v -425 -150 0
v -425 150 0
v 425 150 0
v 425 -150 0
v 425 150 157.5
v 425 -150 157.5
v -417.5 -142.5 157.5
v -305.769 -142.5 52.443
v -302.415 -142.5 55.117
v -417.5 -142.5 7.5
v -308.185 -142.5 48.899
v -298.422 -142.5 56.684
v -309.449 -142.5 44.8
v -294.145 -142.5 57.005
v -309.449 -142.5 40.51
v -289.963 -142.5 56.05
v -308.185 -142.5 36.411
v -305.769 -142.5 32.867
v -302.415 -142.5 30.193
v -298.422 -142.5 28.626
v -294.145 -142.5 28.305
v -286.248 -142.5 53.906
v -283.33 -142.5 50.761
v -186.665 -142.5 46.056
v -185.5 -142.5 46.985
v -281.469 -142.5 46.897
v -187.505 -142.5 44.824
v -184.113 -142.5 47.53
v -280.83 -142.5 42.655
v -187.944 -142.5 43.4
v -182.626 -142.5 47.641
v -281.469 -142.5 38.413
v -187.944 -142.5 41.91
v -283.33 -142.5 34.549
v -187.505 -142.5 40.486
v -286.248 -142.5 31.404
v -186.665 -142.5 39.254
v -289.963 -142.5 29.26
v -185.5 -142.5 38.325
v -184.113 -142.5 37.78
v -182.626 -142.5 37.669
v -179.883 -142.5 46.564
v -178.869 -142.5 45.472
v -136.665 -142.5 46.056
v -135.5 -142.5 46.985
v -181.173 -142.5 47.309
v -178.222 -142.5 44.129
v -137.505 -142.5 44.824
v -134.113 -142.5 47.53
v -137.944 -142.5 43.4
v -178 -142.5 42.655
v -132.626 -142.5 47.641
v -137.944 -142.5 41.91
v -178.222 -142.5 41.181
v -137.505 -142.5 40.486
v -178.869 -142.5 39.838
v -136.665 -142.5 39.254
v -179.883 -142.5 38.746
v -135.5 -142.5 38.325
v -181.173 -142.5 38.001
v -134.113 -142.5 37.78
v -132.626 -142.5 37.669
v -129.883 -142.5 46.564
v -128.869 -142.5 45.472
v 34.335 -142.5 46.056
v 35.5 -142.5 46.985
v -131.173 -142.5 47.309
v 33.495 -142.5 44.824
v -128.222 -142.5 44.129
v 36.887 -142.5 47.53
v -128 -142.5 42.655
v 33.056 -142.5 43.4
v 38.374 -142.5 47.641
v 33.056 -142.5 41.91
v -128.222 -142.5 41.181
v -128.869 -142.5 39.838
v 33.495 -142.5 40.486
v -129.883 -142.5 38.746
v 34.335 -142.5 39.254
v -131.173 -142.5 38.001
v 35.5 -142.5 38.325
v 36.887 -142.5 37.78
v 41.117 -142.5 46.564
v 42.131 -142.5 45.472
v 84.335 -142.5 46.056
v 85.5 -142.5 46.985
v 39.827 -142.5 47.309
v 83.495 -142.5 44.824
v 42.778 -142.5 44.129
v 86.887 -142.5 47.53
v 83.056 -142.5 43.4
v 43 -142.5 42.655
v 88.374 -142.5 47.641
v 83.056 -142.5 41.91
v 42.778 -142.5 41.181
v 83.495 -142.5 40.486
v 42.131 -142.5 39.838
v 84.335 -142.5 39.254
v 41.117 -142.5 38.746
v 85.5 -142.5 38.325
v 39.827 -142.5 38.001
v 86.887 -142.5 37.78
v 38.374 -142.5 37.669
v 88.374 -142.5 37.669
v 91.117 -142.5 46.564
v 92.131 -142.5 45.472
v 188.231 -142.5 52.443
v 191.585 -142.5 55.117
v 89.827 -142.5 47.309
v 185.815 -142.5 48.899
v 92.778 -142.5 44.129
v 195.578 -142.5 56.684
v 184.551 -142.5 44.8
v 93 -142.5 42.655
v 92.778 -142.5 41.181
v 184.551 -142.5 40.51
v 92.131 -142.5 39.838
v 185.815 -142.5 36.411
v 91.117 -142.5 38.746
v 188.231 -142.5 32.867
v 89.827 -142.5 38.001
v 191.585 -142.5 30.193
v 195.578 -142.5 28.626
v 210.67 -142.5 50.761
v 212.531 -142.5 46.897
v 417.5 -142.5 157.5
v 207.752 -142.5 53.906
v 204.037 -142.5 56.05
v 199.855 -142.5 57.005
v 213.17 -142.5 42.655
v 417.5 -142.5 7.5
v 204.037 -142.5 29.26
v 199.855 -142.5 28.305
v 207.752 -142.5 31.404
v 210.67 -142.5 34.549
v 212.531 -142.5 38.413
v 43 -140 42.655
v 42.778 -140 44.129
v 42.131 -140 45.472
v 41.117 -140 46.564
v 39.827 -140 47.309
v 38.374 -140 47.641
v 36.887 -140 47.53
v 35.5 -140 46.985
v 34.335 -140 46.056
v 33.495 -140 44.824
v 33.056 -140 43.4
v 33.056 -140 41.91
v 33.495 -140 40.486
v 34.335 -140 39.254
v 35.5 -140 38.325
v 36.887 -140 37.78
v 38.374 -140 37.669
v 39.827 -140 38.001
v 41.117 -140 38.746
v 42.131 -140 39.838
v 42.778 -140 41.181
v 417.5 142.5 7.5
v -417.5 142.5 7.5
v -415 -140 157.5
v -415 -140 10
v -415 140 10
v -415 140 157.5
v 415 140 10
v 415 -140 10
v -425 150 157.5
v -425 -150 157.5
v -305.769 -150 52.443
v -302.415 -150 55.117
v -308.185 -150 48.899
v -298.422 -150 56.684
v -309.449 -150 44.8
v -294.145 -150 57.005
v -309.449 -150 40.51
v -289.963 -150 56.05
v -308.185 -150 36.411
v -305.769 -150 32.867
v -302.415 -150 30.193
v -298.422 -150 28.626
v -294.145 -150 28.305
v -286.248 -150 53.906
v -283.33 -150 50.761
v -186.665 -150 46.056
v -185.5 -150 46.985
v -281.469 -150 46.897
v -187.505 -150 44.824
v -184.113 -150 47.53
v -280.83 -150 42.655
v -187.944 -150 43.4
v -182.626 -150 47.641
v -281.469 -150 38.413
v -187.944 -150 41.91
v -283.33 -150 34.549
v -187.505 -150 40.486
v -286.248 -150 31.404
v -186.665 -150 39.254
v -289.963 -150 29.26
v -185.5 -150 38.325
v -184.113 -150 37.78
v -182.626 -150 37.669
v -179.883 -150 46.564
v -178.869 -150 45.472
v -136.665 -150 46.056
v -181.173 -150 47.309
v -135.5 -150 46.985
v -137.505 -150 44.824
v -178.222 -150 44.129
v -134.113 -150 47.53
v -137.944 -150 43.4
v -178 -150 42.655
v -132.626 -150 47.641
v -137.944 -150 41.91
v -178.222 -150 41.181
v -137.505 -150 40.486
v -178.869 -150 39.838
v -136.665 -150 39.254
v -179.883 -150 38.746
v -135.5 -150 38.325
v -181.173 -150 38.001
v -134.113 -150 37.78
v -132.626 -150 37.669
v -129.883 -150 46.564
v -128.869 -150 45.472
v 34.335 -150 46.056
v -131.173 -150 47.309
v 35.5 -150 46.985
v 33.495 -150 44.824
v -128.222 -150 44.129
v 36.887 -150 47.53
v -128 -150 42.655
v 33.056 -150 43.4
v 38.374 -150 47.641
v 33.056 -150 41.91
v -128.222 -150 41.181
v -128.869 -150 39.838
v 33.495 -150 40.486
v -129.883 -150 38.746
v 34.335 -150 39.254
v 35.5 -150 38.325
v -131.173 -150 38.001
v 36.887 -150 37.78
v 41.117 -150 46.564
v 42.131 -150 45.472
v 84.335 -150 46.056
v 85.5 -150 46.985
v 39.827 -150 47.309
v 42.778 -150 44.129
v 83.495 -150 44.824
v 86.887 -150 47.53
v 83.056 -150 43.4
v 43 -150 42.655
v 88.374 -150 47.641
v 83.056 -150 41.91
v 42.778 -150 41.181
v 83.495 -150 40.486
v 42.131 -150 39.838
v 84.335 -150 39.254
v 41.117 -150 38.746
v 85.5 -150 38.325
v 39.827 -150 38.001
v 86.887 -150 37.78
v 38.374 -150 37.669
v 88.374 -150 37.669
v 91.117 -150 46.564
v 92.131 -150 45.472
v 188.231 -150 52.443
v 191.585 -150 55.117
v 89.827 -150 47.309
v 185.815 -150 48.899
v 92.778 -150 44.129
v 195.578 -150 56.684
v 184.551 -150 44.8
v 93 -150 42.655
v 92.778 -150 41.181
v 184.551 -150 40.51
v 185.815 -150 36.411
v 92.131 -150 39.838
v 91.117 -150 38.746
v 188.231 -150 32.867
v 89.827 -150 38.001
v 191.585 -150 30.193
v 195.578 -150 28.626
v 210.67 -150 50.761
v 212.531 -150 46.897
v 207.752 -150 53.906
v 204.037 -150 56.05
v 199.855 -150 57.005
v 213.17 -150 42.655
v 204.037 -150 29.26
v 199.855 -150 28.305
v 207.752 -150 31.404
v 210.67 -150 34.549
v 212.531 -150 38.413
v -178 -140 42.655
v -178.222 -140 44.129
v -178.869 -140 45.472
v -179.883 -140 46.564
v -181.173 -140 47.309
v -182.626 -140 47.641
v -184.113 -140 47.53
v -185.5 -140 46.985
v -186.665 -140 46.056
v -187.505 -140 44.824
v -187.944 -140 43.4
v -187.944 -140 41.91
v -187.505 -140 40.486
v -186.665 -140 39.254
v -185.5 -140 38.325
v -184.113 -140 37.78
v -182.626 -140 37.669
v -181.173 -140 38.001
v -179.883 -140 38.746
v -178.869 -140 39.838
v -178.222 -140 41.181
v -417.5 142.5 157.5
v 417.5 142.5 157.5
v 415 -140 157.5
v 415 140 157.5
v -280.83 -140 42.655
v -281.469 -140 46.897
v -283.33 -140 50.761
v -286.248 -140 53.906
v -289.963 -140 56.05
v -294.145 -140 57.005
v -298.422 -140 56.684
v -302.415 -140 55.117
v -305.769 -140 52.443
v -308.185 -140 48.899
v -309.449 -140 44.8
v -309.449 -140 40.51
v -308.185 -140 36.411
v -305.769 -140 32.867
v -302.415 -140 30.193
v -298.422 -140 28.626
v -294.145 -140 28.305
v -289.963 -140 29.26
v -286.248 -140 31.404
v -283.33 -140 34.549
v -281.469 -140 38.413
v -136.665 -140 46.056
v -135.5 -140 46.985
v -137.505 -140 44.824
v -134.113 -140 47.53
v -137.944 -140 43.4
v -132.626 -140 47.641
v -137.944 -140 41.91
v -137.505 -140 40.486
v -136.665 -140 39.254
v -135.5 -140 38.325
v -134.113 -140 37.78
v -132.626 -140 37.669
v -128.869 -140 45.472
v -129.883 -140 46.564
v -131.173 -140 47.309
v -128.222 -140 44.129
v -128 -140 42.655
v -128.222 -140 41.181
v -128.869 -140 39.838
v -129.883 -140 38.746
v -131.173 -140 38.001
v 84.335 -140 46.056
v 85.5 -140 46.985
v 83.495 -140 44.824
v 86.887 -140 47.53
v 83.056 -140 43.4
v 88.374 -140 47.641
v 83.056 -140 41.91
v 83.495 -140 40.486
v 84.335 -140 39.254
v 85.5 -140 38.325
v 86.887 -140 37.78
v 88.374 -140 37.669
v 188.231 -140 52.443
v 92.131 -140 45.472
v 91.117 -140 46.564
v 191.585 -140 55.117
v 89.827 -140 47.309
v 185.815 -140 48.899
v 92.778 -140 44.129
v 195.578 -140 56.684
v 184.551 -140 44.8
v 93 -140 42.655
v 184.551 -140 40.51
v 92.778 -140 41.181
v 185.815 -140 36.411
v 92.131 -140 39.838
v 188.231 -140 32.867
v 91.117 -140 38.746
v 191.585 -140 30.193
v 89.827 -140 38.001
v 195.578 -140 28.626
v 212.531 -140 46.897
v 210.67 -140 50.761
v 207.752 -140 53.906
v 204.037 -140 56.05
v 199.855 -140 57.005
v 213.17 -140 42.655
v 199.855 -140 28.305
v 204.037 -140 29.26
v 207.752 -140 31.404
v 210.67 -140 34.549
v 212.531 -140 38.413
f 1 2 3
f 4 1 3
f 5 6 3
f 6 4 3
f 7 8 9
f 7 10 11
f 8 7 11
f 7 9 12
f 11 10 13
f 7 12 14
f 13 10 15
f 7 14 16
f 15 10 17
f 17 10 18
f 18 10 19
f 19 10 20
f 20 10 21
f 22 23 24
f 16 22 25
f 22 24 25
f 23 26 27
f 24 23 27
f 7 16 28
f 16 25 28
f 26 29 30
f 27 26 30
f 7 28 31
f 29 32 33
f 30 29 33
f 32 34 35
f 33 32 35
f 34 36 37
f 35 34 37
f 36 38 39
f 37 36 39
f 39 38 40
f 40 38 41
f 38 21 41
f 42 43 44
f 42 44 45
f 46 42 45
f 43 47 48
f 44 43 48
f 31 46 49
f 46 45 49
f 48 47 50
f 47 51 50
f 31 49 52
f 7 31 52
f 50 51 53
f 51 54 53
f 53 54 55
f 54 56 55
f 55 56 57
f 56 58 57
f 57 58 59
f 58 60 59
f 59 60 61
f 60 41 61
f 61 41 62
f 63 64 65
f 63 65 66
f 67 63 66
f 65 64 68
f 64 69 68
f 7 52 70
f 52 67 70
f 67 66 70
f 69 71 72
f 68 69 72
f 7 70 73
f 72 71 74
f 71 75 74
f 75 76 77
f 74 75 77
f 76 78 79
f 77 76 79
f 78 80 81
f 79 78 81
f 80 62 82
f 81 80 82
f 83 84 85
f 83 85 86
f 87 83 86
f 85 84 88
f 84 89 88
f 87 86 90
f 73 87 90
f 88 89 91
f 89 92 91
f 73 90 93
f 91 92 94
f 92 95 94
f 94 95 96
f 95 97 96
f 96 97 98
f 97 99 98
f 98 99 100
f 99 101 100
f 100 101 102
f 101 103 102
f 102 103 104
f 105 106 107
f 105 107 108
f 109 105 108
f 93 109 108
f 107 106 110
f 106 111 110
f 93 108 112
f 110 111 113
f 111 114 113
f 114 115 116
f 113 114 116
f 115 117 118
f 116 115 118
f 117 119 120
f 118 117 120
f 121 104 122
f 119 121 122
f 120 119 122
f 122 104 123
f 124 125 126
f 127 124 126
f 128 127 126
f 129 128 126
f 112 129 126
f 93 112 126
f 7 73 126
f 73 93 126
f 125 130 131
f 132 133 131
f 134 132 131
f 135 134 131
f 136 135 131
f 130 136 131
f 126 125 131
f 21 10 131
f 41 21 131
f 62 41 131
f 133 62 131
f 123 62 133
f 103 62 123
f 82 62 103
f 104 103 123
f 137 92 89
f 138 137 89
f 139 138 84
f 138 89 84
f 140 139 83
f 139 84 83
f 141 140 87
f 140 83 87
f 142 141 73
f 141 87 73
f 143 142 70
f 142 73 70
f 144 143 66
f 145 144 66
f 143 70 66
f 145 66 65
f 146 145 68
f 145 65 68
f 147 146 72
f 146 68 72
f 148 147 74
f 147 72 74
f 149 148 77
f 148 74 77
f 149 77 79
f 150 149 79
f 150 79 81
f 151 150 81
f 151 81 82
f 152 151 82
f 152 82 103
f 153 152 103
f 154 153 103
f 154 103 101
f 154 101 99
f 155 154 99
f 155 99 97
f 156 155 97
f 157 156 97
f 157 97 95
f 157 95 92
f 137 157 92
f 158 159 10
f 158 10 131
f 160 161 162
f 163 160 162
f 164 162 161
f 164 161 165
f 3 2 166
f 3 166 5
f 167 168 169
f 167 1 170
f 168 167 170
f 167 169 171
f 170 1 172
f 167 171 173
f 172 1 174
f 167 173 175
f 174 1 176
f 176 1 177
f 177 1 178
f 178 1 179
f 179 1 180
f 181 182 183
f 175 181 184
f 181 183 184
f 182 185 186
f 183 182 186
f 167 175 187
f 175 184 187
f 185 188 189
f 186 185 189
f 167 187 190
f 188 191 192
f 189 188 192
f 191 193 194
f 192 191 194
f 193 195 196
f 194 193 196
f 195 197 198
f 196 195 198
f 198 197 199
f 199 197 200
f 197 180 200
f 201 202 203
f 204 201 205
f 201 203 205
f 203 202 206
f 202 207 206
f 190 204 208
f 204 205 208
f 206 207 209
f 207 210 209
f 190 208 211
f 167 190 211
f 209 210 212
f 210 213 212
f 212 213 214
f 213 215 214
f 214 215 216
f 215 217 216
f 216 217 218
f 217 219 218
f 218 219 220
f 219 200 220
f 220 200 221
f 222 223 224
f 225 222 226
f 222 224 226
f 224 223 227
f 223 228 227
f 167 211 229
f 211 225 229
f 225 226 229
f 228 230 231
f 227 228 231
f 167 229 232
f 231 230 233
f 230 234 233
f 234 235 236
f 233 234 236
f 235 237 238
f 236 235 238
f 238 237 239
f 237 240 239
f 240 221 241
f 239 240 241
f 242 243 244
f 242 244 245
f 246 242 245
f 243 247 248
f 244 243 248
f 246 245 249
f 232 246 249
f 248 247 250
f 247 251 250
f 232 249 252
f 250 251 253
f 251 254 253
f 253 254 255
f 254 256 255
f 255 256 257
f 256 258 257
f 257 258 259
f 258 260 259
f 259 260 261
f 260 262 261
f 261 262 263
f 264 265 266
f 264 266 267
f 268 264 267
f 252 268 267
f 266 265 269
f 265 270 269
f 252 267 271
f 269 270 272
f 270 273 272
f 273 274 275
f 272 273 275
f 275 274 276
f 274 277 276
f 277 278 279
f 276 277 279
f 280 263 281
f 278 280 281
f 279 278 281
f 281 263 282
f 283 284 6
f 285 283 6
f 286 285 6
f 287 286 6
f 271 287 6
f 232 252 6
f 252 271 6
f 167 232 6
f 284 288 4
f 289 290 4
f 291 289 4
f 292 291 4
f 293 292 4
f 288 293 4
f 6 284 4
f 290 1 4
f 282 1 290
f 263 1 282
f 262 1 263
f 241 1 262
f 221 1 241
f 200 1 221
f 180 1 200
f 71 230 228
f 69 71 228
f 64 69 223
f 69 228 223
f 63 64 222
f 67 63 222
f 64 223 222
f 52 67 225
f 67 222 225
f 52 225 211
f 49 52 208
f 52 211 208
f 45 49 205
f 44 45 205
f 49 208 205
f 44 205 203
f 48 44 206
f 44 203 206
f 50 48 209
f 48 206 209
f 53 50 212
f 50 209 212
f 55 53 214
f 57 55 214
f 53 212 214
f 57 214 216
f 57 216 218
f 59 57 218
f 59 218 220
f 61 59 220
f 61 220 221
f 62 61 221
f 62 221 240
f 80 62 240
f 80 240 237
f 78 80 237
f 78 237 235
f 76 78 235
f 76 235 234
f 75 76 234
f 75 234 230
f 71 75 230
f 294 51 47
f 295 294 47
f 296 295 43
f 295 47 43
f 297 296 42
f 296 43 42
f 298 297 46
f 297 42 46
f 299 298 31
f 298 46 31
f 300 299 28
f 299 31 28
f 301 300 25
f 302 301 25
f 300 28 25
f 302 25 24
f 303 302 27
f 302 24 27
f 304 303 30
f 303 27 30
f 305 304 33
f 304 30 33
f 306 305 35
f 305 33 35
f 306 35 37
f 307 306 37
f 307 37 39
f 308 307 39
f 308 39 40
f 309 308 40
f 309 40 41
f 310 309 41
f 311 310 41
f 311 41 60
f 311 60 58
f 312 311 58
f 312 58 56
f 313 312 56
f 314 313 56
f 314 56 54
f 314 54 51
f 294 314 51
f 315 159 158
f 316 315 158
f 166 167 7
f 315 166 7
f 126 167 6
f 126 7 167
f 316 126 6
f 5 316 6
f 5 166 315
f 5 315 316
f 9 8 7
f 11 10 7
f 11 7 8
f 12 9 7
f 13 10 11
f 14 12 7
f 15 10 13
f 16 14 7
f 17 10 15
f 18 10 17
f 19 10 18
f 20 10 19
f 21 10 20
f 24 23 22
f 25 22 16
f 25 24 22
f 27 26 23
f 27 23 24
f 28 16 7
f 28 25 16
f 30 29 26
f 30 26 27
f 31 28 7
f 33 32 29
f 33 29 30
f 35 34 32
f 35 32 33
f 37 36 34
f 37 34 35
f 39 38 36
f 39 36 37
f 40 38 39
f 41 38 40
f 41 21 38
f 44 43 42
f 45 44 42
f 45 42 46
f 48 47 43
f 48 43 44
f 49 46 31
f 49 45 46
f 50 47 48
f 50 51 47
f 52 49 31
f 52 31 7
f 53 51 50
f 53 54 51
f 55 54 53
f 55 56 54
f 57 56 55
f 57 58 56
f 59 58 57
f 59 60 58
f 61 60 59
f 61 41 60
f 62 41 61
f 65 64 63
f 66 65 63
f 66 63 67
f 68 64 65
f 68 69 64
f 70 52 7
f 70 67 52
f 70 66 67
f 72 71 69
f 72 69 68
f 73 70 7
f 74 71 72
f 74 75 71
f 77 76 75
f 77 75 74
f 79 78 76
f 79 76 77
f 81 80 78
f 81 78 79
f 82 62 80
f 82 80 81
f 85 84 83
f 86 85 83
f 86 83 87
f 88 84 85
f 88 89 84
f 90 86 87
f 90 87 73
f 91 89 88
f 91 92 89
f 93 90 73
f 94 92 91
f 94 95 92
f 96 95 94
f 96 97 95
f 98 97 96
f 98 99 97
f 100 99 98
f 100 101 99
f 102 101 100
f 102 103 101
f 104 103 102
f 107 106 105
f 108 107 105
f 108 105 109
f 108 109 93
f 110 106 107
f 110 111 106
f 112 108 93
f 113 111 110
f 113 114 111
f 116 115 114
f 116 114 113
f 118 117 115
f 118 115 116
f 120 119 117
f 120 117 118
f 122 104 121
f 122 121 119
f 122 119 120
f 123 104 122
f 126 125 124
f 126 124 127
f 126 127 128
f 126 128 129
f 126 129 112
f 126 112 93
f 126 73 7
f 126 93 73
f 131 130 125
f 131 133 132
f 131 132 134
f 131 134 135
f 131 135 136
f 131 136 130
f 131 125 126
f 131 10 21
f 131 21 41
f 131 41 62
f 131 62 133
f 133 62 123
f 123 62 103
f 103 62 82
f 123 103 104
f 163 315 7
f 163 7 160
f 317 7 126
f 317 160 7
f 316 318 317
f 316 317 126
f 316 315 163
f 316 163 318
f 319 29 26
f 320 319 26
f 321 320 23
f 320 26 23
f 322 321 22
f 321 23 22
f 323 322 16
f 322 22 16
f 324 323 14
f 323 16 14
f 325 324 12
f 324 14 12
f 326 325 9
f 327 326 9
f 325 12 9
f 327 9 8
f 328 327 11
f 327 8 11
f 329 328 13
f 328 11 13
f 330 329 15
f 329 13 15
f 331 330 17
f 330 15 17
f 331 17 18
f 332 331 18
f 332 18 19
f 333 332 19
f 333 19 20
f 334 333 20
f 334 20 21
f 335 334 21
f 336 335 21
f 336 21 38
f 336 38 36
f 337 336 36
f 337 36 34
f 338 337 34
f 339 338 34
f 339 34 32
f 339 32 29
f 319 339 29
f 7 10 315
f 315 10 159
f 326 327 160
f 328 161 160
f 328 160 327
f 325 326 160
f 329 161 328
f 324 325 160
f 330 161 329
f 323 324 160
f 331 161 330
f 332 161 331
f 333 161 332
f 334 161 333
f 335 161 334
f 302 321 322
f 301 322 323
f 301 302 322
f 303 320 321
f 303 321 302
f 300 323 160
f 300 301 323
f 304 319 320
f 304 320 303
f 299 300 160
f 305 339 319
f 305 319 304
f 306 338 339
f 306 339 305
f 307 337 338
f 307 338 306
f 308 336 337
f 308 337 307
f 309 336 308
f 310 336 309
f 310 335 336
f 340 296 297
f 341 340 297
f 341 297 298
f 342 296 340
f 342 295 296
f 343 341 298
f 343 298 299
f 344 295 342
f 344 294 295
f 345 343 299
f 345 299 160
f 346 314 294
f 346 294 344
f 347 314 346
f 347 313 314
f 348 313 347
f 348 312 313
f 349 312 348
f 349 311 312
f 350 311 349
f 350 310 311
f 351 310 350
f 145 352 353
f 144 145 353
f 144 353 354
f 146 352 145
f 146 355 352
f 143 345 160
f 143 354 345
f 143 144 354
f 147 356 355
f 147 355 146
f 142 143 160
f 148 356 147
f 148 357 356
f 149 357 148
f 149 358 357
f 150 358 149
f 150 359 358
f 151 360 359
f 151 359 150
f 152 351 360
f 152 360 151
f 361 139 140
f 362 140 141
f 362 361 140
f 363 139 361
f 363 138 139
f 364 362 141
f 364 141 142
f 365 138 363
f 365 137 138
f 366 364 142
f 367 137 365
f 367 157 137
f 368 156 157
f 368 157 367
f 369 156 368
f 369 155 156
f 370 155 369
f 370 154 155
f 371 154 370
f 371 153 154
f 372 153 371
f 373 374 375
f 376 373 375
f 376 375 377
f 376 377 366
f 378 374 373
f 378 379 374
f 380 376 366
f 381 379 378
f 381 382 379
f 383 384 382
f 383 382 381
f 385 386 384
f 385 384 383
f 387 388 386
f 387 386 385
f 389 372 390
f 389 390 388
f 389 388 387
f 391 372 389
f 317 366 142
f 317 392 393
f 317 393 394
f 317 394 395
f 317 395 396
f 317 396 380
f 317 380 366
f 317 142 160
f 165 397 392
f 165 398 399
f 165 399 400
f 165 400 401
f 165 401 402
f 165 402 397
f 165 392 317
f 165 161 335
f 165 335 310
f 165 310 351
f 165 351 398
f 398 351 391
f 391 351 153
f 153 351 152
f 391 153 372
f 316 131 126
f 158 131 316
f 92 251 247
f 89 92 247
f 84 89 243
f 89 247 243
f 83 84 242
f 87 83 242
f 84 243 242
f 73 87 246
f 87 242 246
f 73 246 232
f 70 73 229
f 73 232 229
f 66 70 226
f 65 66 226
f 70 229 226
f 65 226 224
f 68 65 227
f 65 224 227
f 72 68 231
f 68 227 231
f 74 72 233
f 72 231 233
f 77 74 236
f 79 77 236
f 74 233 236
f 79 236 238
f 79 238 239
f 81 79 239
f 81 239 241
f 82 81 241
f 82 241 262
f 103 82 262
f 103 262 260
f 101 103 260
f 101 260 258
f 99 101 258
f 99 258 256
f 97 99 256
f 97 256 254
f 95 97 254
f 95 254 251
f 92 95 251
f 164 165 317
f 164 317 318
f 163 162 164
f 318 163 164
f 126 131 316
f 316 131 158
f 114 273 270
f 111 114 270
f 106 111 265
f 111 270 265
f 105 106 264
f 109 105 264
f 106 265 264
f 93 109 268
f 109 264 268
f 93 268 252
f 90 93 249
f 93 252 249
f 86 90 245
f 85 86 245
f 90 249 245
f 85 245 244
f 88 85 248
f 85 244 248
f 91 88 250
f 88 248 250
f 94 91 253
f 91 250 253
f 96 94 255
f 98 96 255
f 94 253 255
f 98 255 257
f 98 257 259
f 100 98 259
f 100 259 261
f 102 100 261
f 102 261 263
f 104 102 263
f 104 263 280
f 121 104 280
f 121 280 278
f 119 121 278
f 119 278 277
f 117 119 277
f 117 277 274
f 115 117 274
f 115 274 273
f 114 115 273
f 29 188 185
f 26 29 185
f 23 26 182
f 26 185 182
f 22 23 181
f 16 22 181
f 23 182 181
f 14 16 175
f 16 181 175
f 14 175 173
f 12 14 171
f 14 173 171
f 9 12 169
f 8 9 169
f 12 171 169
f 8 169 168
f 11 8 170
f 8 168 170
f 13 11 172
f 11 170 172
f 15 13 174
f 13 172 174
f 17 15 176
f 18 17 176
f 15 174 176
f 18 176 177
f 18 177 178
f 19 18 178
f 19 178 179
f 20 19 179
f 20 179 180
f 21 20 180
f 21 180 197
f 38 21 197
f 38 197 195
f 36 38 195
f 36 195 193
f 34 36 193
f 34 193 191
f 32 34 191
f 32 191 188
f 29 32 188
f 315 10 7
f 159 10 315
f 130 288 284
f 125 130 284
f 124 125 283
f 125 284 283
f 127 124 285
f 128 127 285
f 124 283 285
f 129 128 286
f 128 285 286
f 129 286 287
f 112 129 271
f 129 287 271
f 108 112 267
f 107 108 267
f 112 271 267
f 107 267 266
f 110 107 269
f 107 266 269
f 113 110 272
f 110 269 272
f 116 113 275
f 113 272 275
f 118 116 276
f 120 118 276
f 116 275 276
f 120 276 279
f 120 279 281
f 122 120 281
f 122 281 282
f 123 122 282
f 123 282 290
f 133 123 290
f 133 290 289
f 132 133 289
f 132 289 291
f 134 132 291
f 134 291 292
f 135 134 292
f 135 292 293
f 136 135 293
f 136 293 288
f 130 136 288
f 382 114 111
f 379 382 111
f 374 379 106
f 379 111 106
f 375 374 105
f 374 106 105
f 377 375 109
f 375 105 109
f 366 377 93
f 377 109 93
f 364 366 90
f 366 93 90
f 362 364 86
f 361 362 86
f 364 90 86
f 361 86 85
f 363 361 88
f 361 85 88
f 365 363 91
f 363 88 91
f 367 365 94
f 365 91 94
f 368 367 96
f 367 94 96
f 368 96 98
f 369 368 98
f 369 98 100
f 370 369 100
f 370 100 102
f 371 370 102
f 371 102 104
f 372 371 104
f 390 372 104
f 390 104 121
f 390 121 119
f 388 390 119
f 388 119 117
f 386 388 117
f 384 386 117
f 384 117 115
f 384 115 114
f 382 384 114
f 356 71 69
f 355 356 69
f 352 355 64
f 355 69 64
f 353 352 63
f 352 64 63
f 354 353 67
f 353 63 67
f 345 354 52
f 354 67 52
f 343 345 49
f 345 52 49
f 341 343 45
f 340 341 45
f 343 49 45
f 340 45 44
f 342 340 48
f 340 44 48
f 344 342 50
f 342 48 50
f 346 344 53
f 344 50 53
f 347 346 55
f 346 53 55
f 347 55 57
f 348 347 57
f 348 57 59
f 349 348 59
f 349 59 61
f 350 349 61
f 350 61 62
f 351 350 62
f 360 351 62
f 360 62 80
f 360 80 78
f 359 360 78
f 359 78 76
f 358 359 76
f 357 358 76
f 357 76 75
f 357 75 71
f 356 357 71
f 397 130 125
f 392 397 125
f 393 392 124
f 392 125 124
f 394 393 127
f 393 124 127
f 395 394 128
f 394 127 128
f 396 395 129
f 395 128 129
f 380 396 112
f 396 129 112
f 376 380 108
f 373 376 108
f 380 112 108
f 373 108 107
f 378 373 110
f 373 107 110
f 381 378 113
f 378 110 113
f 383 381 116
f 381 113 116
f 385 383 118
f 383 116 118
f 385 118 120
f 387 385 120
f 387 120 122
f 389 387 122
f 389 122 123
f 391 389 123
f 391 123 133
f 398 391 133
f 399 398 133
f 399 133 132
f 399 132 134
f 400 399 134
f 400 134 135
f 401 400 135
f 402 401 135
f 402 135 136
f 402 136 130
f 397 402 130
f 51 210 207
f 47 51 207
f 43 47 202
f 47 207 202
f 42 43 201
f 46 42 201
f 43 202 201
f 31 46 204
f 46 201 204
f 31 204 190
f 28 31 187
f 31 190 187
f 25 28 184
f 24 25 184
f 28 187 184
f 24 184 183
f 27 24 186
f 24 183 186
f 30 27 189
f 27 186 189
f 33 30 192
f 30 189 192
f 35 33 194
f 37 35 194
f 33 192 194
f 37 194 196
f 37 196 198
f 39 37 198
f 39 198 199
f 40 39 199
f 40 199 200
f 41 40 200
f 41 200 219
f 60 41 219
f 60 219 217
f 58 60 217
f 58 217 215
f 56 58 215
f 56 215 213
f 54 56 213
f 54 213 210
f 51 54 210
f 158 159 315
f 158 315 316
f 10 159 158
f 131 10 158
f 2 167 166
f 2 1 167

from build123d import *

# Parameters (mm, degrees)
F0_W     = 850
F0_H     = 300
F1_DEPTH = 7.5
F2_W     = 850
F2_H     = 300
F2_W_2   = 835
F2_H_2   = 285
F3_DEPTH = 150
F4_DEPTH = 2.5
F5_W     = 835
F5_H     = 285
F5_W_2   = 830
F5_H_2   = 280
F6_DEPTH = 147.5
F7_R     = 5
F7_R_2   = 14.39
F8_DEPTH = 25


with BuildPart() as f1:
    # F0 (on Top) → F1 (new body)
    with BuildSketch(Plane.XY):
        Rectangle(F0_W, F0_H)
    extrude(amount=F1_DEPTH)

    # F2 (on face) → F3 (join)
    with BuildSketch(Plane.XY.offset(7.5)):
        Rectangle(F2_W, F2_H)
        Rectangle(F2_W_2, F2_H_2, mode=Mode.SUBTRACT)
    extrude(amount=F3_DEPTH)


with BuildPart() as f4:
    # F4 (new): a face of the model
    f4_faces = [f1.part.faces().sort_by_distance(p)[0] for p in [
        (0, 0, 7.5),
    ]]
    extrude(f4_faces, amount=F4_DEPTH)

    # F5 (on face) → F6 (join)
    with BuildSketch(Plane.XY.offset(10)):
        Rectangle(F5_W, F5_H)
        Rectangle(F5_W_2, F5_H_2, mode=Mode.SUBTRACT)
    extrude(amount=F6_DEPTH)


with BuildPart() as f8_tool:
    # F7 (on face) → F8 (new body)
    with BuildSketch(Plane.XZ.offset(150)):
        with Locations((-133, 42.655)):
            Circle(F7_R)
        with Locations((38, 42.655)):
            Circle(F7_R)
        with Locations((88, 42.655)):
            Circle(F7_R)
        with Locations((-183, 42.655)):
            Circle(F7_R)
        with Locations((198.78, 42.655)):
            Circle(F7_R_2)
        with Locations((-295.22, 42.655)):
            Circle(F7_R_2)
    extrude(amount=-F8_DEPTH)


with BuildPart() as f1_1:
    add(f1.part)

    # F8: cut by f8_tool
    add(f8_tool.part, mode=Mode.SUBTRACT)


with BuildPart() as f4_1:
    add(f4.part)

    # F8: cut by f8_tool
    add(f8_tool.part, mode=Mode.SUBTRACT)


solid = Compound([f1_1.part, f4_1.part])
